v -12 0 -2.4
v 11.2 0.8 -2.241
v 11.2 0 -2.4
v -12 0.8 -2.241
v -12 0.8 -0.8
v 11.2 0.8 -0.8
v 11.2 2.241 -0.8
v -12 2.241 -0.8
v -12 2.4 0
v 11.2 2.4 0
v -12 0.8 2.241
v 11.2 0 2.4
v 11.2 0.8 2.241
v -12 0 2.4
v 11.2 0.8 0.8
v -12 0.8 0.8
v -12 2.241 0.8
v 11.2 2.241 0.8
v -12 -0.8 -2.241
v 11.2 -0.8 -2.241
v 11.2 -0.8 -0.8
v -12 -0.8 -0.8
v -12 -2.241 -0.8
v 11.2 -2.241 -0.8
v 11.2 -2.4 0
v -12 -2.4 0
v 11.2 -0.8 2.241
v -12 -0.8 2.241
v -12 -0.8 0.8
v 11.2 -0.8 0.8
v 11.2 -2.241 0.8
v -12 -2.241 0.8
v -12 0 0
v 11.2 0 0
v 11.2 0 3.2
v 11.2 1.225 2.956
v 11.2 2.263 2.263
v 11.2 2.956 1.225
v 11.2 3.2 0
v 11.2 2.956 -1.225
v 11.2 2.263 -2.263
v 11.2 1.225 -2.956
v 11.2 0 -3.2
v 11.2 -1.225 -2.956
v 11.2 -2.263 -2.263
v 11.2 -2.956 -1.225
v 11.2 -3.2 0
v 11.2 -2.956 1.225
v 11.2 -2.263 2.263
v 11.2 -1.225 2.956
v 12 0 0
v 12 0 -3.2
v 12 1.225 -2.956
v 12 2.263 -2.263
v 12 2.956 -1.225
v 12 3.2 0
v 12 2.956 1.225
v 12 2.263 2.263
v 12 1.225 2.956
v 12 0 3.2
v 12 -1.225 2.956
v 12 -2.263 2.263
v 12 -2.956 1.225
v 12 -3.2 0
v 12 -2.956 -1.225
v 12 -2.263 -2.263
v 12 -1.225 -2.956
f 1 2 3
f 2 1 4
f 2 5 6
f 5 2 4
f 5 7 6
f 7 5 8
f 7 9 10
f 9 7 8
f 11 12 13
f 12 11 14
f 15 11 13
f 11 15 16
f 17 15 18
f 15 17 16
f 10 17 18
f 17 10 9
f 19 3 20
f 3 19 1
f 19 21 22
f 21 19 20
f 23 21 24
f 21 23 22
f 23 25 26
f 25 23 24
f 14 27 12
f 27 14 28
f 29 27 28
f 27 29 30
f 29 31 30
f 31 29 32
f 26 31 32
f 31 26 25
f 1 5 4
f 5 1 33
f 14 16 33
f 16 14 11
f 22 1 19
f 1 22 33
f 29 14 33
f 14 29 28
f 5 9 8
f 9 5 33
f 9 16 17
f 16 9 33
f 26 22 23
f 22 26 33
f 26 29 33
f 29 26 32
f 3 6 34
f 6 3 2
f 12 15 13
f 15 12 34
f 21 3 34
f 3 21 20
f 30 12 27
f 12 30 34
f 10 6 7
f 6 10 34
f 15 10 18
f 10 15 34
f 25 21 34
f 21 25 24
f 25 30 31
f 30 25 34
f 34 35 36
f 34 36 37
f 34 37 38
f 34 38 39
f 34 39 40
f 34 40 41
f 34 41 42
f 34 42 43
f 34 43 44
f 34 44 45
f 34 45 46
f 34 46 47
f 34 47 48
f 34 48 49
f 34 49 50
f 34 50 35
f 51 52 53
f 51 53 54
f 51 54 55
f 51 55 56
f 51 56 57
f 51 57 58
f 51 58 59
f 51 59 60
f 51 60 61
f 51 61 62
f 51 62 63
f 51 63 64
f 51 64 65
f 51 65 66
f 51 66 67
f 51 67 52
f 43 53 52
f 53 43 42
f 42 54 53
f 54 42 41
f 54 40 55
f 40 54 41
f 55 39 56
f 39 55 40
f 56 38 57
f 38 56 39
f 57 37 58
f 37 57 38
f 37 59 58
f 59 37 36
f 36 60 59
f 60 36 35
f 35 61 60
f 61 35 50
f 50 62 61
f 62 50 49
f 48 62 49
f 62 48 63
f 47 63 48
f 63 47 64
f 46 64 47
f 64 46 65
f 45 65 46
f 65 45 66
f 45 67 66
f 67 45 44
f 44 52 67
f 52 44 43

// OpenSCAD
// file: ../p/stud3.scad
use <../lib.scad>
use <4-4cyli.scad>
use <4-4disc.scad>
use <4-4edge.scad>
$fa=1; $fs=0.2;
function ldraw_lib__stud3(realsolid=false) = realsolid ? 
    [openscad(translate([0,0,-eps()], o=cylinder(4+eps(), r=4)),2)] : [
// 0 Stud Tube Solid
// 0 Name: stud3.dat
// 0 Author: James Jessiman
// 0 !LDRAW_ORG Primitive UPDATE 2012-01
// 0 !LICENSE Licensed under CC BY 2.0 and CC BY 4.0 : see CAreadme.txt
// 
// 0 BFC CERTIFY CCW
  [0,"BFC","CERTIFY"],
  [0,"BFC","CCW"],
// 
// 0 !HISTORY 2002-04-04 [sbliss] Modified for BFC compliance
// 0 !HISTORY 2002-04-25 [PTadmin] Official Update 2002-02
// 0 !HISTORY 2007-06-24 [PTadmin] Header formatted for Contributor Agreement
// 0 !HISTORY 2008-07-01 [PTadmin] Official Update 2008-01
// 0 !HISTORY 2012-02-16 [Philo] Changed to CCW
// 0 !HISTORY 2012-03-30 [PTadmin] Official Update 2012-01
// 
// 
// 1 16 0 -4 0 4 0 0 0 1 0 0 0 4 4-4edge.dat
  [1,16,0,-4,0,4,0,0,0,1,0,0,0,4, ldraw_lib__4_4edge(realsolid)],
// 1 16 0 0 0 4 0 0 0 1 0 0 0 4 4-4edge.dat
  [1,16,0,0,0,4,0,0,0,1,0,0,0,4, ldraw_lib__4_4edge(realsolid)],
// 1 16 0 -4 0 4 0 0 0 1 0 0 0 4 4-4disc.dat
  [1,16,0,-4,0,4,0,0,0,1,0,0,0,4, ldraw_lib__4_4disc(realsolid)],
// 1 16 0 -4 0 4 0 0 0 4 0 0 0 4 4-4cyli.dat
  [1,16,0,-4,0,4,0,0,0,4,0,0,0,4, ldraw_lib__4_4cyli(realsolid)],
];
module ldraw_lib__stud3(step=0, col=false, unit=2/5, alt=false, line=0.2, solid=!$preview)
    makepoly(ldraw_lib__stud3(solid), step=step, col=col, unit=unit, alt=alt, line=line, solid=solid);
ldraw_lib__stud3(line=0.2);
// file: ../p/stud.scad
use <../lib.scad>
use <4-4cyli.scad>
use <4-4disc.scad>
use <4-4edge.scad>
$fa=1; $fs=0.2;
function ldraw_lib__stud(realsolid=false) = realsolid ? 
    [openscad(translate([0,0,-eps()], o=cylinder(4+eps(), r=6)),2)] : [
// 0 Stud
// 0 Name: stud.dat
// 0 Author: James Jessiman
// 0 !LDRAW_ORG Primitive UPDATE 2012-01
// 0 !LICENSE Licensed under CC BY 2.0 and CC BY 4.0 : see CAreadme.txt
// 
// 0 BFC CERTIFY CCW
  [0,"BFC","CERTIFY"],
  [0,"BFC","CCW"],
// 
// 0 !HISTORY 2002-04-04 [sbliss] Modified for BFC compliance
// 0 !HISTORY 2002-04-25 [PTadmin] Official Update 2002-02
// 0 !HISTORY 2007-06-24 [PTadmin] Header formatted for Contributor Agreement
// 0 !HISTORY 2008-07-01 [PTadmin] Official Update 2008-01
// 0 !HISTORY 2012-02-16 [Philo] Changed to CCW
// 0 !HISTORY 2012-03-30 [PTadmin] Official Update 2012-01
// 
// 
// 1 16 0 0 0 6 0 0 0 1 0 0 0 6 4-4edge.dat
  [1,16,0,0,0,6,0,0,0,1,0,0,0,6, ldraw_lib__4_4edge(realsolid)],
// 1 16 0 -4 0 6 0 0 0 1 0 0 0 6 4-4edge.dat
  [1,16,0,-4,0,6,0,0,0,1,0,0,0,6, ldraw_lib__4_4edge(realsolid)],
// 1 16 0 0 0 6 0 0 0 -4 0 0 0 6 4-4cyli.dat
  [1,16,0,0,0,6,0,0,0,-4,0,0,0,6, ldraw_lib__4_4cyli(realsolid)],
// 1 16 0 -4 0 6 0 0 0 1 0 0 0 6 4-4disc.dat
  [1,16,0,-4,0,6,0,0,0,1,0,0,0,6, ldraw_lib__4_4disc(realsolid)],
];
module ldraw_lib__stud(step=0, col=false, unit=2/5, alt=false, line=0.2, solid=!$preview)
    makepoly(ldraw_lib__stud(solid), step=step, col=col, unit=unit, alt=alt, line=line, solid=solid);
ldraw_lib__stud(line=0.2);
// file: ../p/box5.scad
use <../lib.scad>
$fa=1; $fs=0.2;
function ldraw_lib__box5(realsolid=false) = [
// 0 Box with 5 Faces and All Edges
// 0 Name: box5.dat
// 0 Author: James Jessiman
// 0 !LDRAW_ORG Primitive UPDATE 2012-01
// 0 !LICENSE Licensed under CC BY 2.0 and CC BY 4.0 : see CAreadme.txt
// 
// 0 BFC CERTIFY CCW
  [0,"BFC","CERTIFY"],
  [0,"BFC","CCW"],
// 
// 0 !HISTORY 2002-04-03 [sbliss] Modified for BFC compliance
// 0 !HISTORY 2002-04-25 [PTadmin] Official Update 2002-02
// 0 !HISTORY 2007-06-24 [PTadmin] Header formatted for Contributor Agreement
// 0 !HISTORY 2008-07-01 [PTadmin] Official Update 2008-01
// 0 !HISTORY 2012-02-16 [Philo] Changed to CCW
// 0 !HISTORY 2012-03-30 [PTadmin] Official Update 2012-01
// 
// 
// 2 24 1 1 1 -1 1 1
  [2,24,1,1,1,-1,1,1],
// 2 24 -1 1 1 -1 1 -1
  [2,24,-1,1,1,-1,1,-1],
// 2 24 -1 1 -1 1 1 -1
  [2,24,-1,1,-1,1,1,-1],
// 2 24 1 1 -1 1 1 1
  [2,24,1,1,-1,1,1,1],
// 2 24 1 0 1 -1 0 1
  [2,24,1,0,1,-1,0,1],
// 2 24 -1 0 1 -1 0 -1
  [2,24,-1,0,1,-1,0,-1],
// 2 24 -1 0 -1 1 0 -1
  [2,24,-1,0,-1,1,0,-1],
// 2 24 1 0 -1 1 0 1
  [2,24,1,0,-1,1,0,1],
// 2 24 1 0 1 1 1 1
  [2,24,1,0,1,1,1,1],
// 2 24 -1 0 1 -1 1 1
  [2,24,-1,0,1,-1,1,1],
// 2 24 1 0 -1 1 1 -1
  [2,24,1,0,-1,1,1,-1],
// 2 24 -1 0 -1 -1 1 -1
  [2,24,-1,0,-1,-1,1,-1],
// 4 16 -1 1 1 1 1 1 1 1 -1 -1 1 -1
  [4,16,-1,1,1,1,1,1,1,1,-1,-1,1,-1],
// 4 16 -1 1 1 -1 0 1 1 0 1 1 1 1
  [4,16,-1,1,1,-1,0,1,1,0,1,1,1,1],
// 4 16 -1 1 -1 -1 0 -1 -1 0 1 -1 1 1
  [4,16,-1,1,-1,-1,0,-1,-1,0,1,-1,1,1],
// 4 16 1 1 -1 1 0 -1 -1 0 -1 -1 1 -1
  [4,16,1,1,-1,1,0,-1,-1,0,-1,-1,1,-1],
// 4 16 1 1 1 1 0 1 1 0 -1 1 1 -1
  [4,16,1,1,1,1,0,1,1,0,-1,1,1,-1],
];
module ldraw_lib__box5(step=0, col=false, unit=2/5, alt=false, line=0.2, solid=!$preview)
    makepoly(ldraw_lib__box5(solid), step=step, col=col, unit=unit, alt=alt, line=line, solid=solid);
ldraw_lib__box5(line=0.2);
// file: ../p/box4t.scad
use <../lib.scad>
$fa=1; $fs=0.2;
function ldraw_lib__box4t(realsolid=false) = [
// 0 Box with 4 Adjacent Faces and All Edges
// 0 Name: box4t.dat
// 0 Author: Tore Eriksson [Tore_Eriksson]
// 0 !LDRAW_ORG Primitive UPDATE 2003-02
// 0 !LICENSE Licensed under CC BY 2.0 and CC BY 4.0 : see CAreadme.txt
// 
// 0 BFC CERTIFY CCW
  [0,"BFC","CERTIFY"],
  [0,"BFC","CCW"],
// 
// 0 !HISTORY 1997-09-29 [PTadmin] Official Update 1997-15
// 0 !HISTORY 2002-08-31 [izanette] Modified with WINDZ for BFC compliance
// 0 !HISTORY 2003-08-01 [PTadmin] Official Update 2003-02
// 0 !HISTORY 2007-06-24 [PTadmin] Header formatted for Contributor Agreement
// 0 !HISTORY 2008-07-01 [PTadmin] Official Update 2008-01
// 
// 
// 2 24 1 1 1 -1 1 1
  [2,24,1,1,1,-1,1,1],
// 2 24 -1 1 1 -1 1 -1
  [2,24,-1,1,1,-1,1,-1],
// 2 24 -1 1 -1 1 1 -1
  [2,24,-1,1,-1,1,1,-1],
// 2 24 1 1 -1 1 1 1
  [2,24,1,1,-1,1,1,1],
// 2 24 1 0 1 -1 0 1
  [2,24,1,0,1,-1,0,1],
// 2 24 -1 0 1 -1 0 -1
  [2,24,-1,0,1,-1,0,-1],
// 2 24 -1 0 -1 1 0 -1
  [2,24,-1,0,-1,1,0,-1],
// 2 24 1 0 -1 1 0 1
  [2,24,1,0,-1,1,0,1],
// 2 24 1 0 1 1 1 1
  [2,24,1,0,1,1,1,1],
// 2 24 -1 0 1 -1 1 1
  [2,24,-1,0,1,-1,1,1],
// 2 24 1 0 -1 1 1 -1
  [2,24,1,0,-1,1,1,-1],
// 2 24 -1 0 -1 -1 1 -1
  [2,24,-1,0,-1,-1,1,-1],
// 4 16 1 1 1 1 1 -1 -1 1 -1 -1 1 1
  [4,16,1,1,1,1,1,-1,-1,1,-1,-1,1,1],
// 4 16 1 1 1 -1 1 1 -1 0 1 1 0 1
  [4,16,1,1,1,-1,1,1,-1,0,1,1,0,1],
// 4 16 -1 1 1 -1 1 -1 -1 0 -1 -1 0 1
  [4,16,-1,1,1,-1,1,-1,-1,0,-1,-1,0,1],
// 0 4 16 -1 1 -1 -1 0 -1 1 0 -1 1 1 -1
// 4 16 1 1 -1 1 1 1 1 0 1 1 0 -1
  [4,16,1,1,-1,1,1,1,1,0,1,1,0,-1],
// 0
];
module ldraw_lib__box4t(step=0, col=false, unit=2/5, alt=false, line=0.2, solid=!$preview)
    makepoly(ldraw_lib__box4t(solid), step=step, col=col, unit=unit, alt=alt, line=line, solid=solid);
ldraw_lib__box4t(line=0.2);
// file: s/3004s01.scad
use <../../lib.scad>
use <../../p/box4t.scad>
use <../../p/box5.scad>
use <../../p/stud.scad>
use <../../p/stud3.scad>
$fa=1; $fs=0.2;
function ldraw_lib__s__3004s01(realsolid=false) = [
// 0 ~Brick  1 x  2 without Front Face
// 0 Name: s\3004s01.dat
// 0 Author: James Jessiman
// 0 !LDRAW_ORG Subpart UPDATE 2003-03
// 0 !LICENSE Licensed under CC BY 2.0 and CC BY 4.0 : see CAreadme.txt
// 
// 0 BFC CERTIFY CCW
  [0,"BFC","CERTIFY"],
  [0,"BFC","CCW"],
// 
// 0 !HISTORY 2003-09-07 [jriley] Subfiling, BFC
// 0 !HISTORY 2003-12-19 [PTadmin] Official Update 2003-03
// 0 !HISTORY 2007-08-29 [PTadmin] Header formatted for Contributor Agreement
// 0 !HISTORY 2008-07-01 [PTadmin] Official Update 2008-01
// 
// 
// 1 16 0 4 0 1 0 0 0 -5 0 0 0 1 stud3.dat
  [1,16,0,4,0,1,0,0,0,-5,0,0,0,1, ldraw_lib__stud3(realsolid)],
// 0 BFC INVERTNEXT
  [0,"BFC","INVERTNEXT"],
// 1 16 0 24 0 16 0 0 0 -20 0 0 0 6 box5.dat
  [1,16,0,24,0,16,0,0,0,-20,0,0,0,6, ldraw_lib__box5(realsolid)],
// 4 16 20 24 10 16 24 6 -16 24 6 -20 24 10
  [4,16,20,24,10,16,24,6,-16,24,6,-20,24,10],
// 4 16 -20 24 10 -16 24 6 -16 24 -6 -20 24 -10
  [4,16,-20,24,10,-16,24,6,-16,24,-6,-20,24,-10],
// 4 16 -20 24 -10 -16 24 -6 16 24 -6 20 24 -10
  [4,16,-20,24,-10,-16,24,-6,16,24,-6,20,24,-10],
// 4 16 20 24 -10 16 24 -6 16 24 6 20 24 10
  [4,16,20,24,-10,16,24,-6,16,24,6,20,24,10],
// 1 16 0 24 0 20 0 0 0 -24 0 0 0 10 box4t.dat
  [1,16,0,24,0,20,0,0,0,-24,0,0,0,10, ldraw_lib__box4t(realsolid)],
// 1 16 10 0 0 1 0 0 0 1 0 0 0 1 stud.dat
  [1,16,10,0,0,1,0,0,0,1,0,0,0,1, ldraw_lib__stud(realsolid)],
// 1 16 -10 0 0 1 0 0 0 1 0 0 0 1 stud.dat
  [1,16,-10,0,0,1,0,0,0,1,0,0,0,1, ldraw_lib__stud(realsolid)],
// 0
];
module ldraw_lib__s__3004s01(step=0, col=false, unit=2/5, alt=false, line=0.2, solid=!$preview)
    makepoly(ldraw_lib__s__3004s01(solid), step=step, col=col, unit=unit, alt=alt, line=line, solid=solid);
ldraw_lib__s__3004s01(line=0.2);
// file: ../p/4-4edge.scad
use <../lib.scad>
$fa=1; $fs=0.2;
function ldraw_lib__4_4edge(realsolid=false) = [
// 0 Circle 1.0
// 0 Name: 4-4edge.dat
// 0 Author: James Jessiman
// 0 !LDRAW_ORG Primitive UPDATE 2017-01
// 0 !LICENSE Licensed under CC BY 2.0 and CC BY 4.0 : see CAreadme.txt
// 
// 0 BFC CERTIFY CCW
  [0,"BFC","CERTIFY"],
  [0,"BFC","CCW"],
// 
// 0 !HISTORY 1998-12-15 [PTadmin] Official Update 1998-10
// 0 !HISTORY 2005-12-28 [PTadmin] Official Update 2005-01
// 0 !HISTORY 2007-06-24 [PTadmin] Header formatted for Contributor Agreement
// 0 !HISTORY 2008-07-01 [PTadmin] Official Update 2008-01
// 0 !HISTORY 2017-01-15 [Steffen] BFCed
// 0 !HISTORY 2017-12-30 [PTadmin] Official Update 2017-01
// 
// 
// 2 24 1 0 0 0.9239 0 0.3827
  [2,24,1,0,0,0.9239,0,0.3827],
// 2 24 0.9239 0 0.3827 0.7071 0 0.7071
  [2,24,0.9239,0,0.3827,0.7071,0,0.7071],
// 2 24 0.7071 0 0.7071 0.3827 0 0.9239
  [2,24,0.7071,0,0.7071,0.3827,0,0.9239],
// 2 24 0.3827 0 0.9239 0 0 1
  [2,24,0.3827,0,0.9239,0,0,1],
// 2 24 0 0 1 -0.3827 0 0.9239
  [2,24,0,0,1,-0.3827,0,0.9239],
// 2 24 -0.3827 0 0.9239 -0.7071 0 0.7071
  [2,24,-0.3827,0,0.9239,-0.7071,0,0.7071],
// 2 24 -0.7071 0 0.7071 -0.9239 0 0.3827
  [2,24,-0.7071,0,0.7071,-0.9239,0,0.3827],
// 2 24 -0.9239 0 0.3827 -1 0 -0
  [2,24,-0.9239,0,0.3827,-1,0,-0],
// 2 24 -1 0 -0 -0.9239 0 -0.3827
  [2,24,-1,0,-0,-0.9239,0,-0.3827],
// 2 24 -0.9239 0 -0.3827 -0.7071 0 -0.7071
  [2,24,-0.9239,0,-0.3827,-0.7071,0,-0.7071],
// 2 24 -0.7071 0 -0.7071 -0.3827 0 -0.9239
  [2,24,-0.7071,0,-0.7071,-0.3827,0,-0.9239],
// 2 24 -0.3827 0 -0.9239 0 0 -1
  [2,24,-0.3827,0,-0.9239,0,0,-1],
// 2 24 0 0 -1 0.3827 0 -0.9239
  [2,24,0,0,-1,0.3827,0,-0.9239],
// 2 24 0.3827 0 -0.9239 0.7071 0 -0.7071
  [2,24,0.3827,0,-0.9239,0.7071,0,-0.7071],
// 2 24 0.7071 0 -0.7071 0.9239 0 -0.3827
  [2,24,0.7071,0,-0.7071,0.9239,0,-0.3827],
// 2 24 0.9239 0 -0.3827 1 0 0
  [2,24,0.9239,0,-0.3827,1,0,0],
];
module ldraw_lib__4_4edge(step=0, col=false, unit=2/5, alt=false, line=0.2, solid=!$preview)
    makepoly(ldraw_lib__4_4edge(solid), step=step, col=col, unit=unit, alt=alt, line=line, solid=solid);
ldraw_lib__4_4edge(line=0.2);
// file: ../p/4-4cyli.scad
use <../lib.scad>
$fa=1; $fs=0.2;
function ldraw_lib__4_4cyli(realsolid=false) = [
// 0 Cylinder 1.0
// 0 Name: 4-4cyli.dat
// 0 Author: James Jessiman
// 0 !LDRAW_ORG Primitive UPDATE 2005-01
// 0 !LICENSE Licensed under CC BY 2.0 and CC BY 4.0 : see CAreadme.txt
// 
// 0 BFC CERTIFY CCW
  [0,"BFC","CERTIFY"],
  [0,"BFC","CCW"],
// 
// 0 !HISTORY 1998-12-15 [PTadmin] Official Update 1998-10
// 0 !HISTORY 2002-03-23 [sbliss] Added BFC statement; merged headers from files in distributions LDraw 0.27 and Complete.
// 0 !HISTORY 2002-04-25 [PTadmin] Official Update 2002-02
// 0 !HISTORY 2004-12-14 [guyvivan] BFC CCW
// 0 !HISTORY 2005-12-28 [PTadmin] Official Update 2005-01
// 0 !HISTORY 2007-06-24 [PTadmin] Header formatted for Contributor Agreement
// 0 !HISTORY 2008-07-01 [PTadmin] Official Update 2008-01
// 
// 
// 4 16 1 1 0 0.9239 1 0.3827 0.9239 0 0.3827 1 0 0
  [4,16,1,1,0,0.9239,1,0.3827,0.9239,0,0.3827,1,0,0],
// 5 24 1 0 0 1 1 0 0.9239 0 0.3827 0.9239 0 -0.3827
  [5,24,1,0,0,1,1,0,0.9239,0,0.3827,0.9239,0,-0.3827],
// 4 16 0.9239 1 0.3827 0.7071 1 0.7071 0.7071 0 0.7071 0.9239 0 0.3827
  [4,16,0.9239,1,0.3827,0.7071,1,0.7071,0.7071,0,0.7071,0.9239,0,0.3827],
// 5 24 0.9239 0 0.3827 0.9239 1 0.3827 0.7071 0 0.7071 1 0 0
  [5,24,0.9239,0,0.3827,0.9239,1,0.3827,0.7071,0,0.7071,1,0,0],
// 4 16 0.7071 1 0.7071 0.3827 1 0.9239 0.3827 0 0.9239 0.7071 0 0.7071
  [4,16,0.7071,1,0.7071,0.3827,1,0.9239,0.3827,0,0.9239,0.7071,0,0.7071],
// 5 24 0.7071 0 0.7071 0.7071 1 0.7071 0.3827 0 0.9239 0.9239 0 0.3827
  [5,24,0.7071,0,0.7071,0.7071,1,0.7071,0.3827,0,0.9239,0.9239,0,0.3827],
// 4 16 0.3827 1 0.9239 0 1 1 0 0 1 0.3827 0 0.9239
  [4,16,0.3827,1,0.9239,0,1,1,0,0,1,0.3827,0,0.9239],
// 5 24 0.3827 0 0.9239 0.3827 1 0.9239 0 0 1 0.7071 0 0.7071
  [5,24,0.3827,0,0.9239,0.3827,1,0.9239,0,0,1,0.7071,0,0.7071],
// 4 16 0 1 1 -0.3827 1 0.9239 -0.3827 0 0.9239 0 0 1
  [4,16,0,1,1,-0.3827,1,0.9239,-0.3827,0,0.9239,0,0,1],
// 5 24 0 0 1 0 1 1 -0.3827 0 0.9239 0.3827 0 0.9239
  [5,24,0,0,1,0,1,1,-0.3827,0,0.9239,0.3827,0,0.9239],
// 4 16 -0.3827 1 0.9239 -0.7071 1 0.7071 -0.7071 0 0.7071 -0.3827 0 0.9239
  [4,16,-0.3827,1,0.9239,-0.7071,1,0.7071,-0.7071,0,0.7071,-0.3827,0,0.9239],
// 5 24 -0.3827 0 0.9239 -0.3827 1 0.9239 -0.7071 0 0.7071 0 0 1
  [5,24,-0.3827,0,0.9239,-0.3827,1,0.9239,-0.7071,0,0.7071,0,0,1],
// 4 16 -0.7071 1 0.7071 -0.9239 1 0.3827 -0.9239 0 0.3827 -0.7071 0 0.7071
  [4,16,-0.7071,1,0.7071,-0.9239,1,0.3827,-0.9239,0,0.3827,-0.7071,0,0.7071],
// 5 24 -0.7071 0 0.7071 -0.7071 1 0.7071 -0.9239 0 0.3827 -0.3827 0 0.9239
  [5,24,-0.7071,0,0.7071,-0.7071,1,0.7071,-0.9239,0,0.3827,-0.3827,0,0.9239],
// 4 16 -0.9239 1 0.3827 -1 1 0 -1 0 0 -0.9239 0 0.3827
  [4,16,-0.9239,1,0.3827,-1,1,0,-1,0,0,-0.9239,0,0.3827],
// 5 24 -0.9239 0 0.3827 -0.9239 1 0.3827 -1 0 0 -0.7071 0 0.7071
  [5,24,-0.9239,0,0.3827,-0.9239,1,0.3827,-1,0,0,-0.7071,0,0.7071],
// 4 16 -1 1 0 -0.9239 1 -0.3827 -0.9239 0 -0.3827 -1 0 0
  [4,16,-1,1,0,-0.9239,1,-0.3827,-0.9239,0,-0.3827,-1,0,0],
// 5 24 -1 0 0 -1 1 0 -0.9239 0 -0.3827 -0.9239 0 0.3827
  [5,24,-1,0,0,-1,1,0,-0.9239,0,-0.3827,-0.9239,0,0.3827],
// 4 16 -0.9239 1 -0.3827 -0.7071 1 -0.7071 -0.7071 0 -0.7071 -0.9239 0 -0.3827
  [4,16,-0.9239,1,-0.3827,-0.7071,1,-0.7071,-0.7071,0,-0.7071,-0.9239,0,-0.3827],
// 5 24 -0.9239 0 -0.3827 -0.9239 1 -0.3827 -0.7071 0 -0.7071 -1 0 0
  [5,24,-0.9239,0,-0.3827,-0.9239,1,-0.3827,-0.7071,0,-0.7071,-1,0,0],
// 4 16 -0.7071 1 -0.7071 -0.3827 1 -0.9239 -0.3827 0 -0.9239 -0.7071 0 -0.7071
  [4,16,-0.7071,1,-0.7071,-0.3827,1,-0.9239,-0.3827,0,-0.9239,-0.7071,0,-0.7071],
// 5 24 -0.7071 0 -0.7071 -0.7071 1 -0.7071 -0.3827 0 -0.9239 -0.9239 0 -0.3827
  [5,24,-0.7071,0,-0.7071,-0.7071,1,-0.7071,-0.3827,0,-0.9239,-0.9239,0,-0.3827],
// 4 16 -0.3827 1 -0.9239 0 1 -1 0 0 -1 -0.3827 0 -0.9239
  [4,16,-0.3827,1,-0.9239,0,1,-1,0,0,-1,-0.3827,0,-0.9239],
// 5 24 -0.3827 0 -0.9239 -0.3827 1 -0.9239 0 0 -1 -0.7071 0 -0.7071
  [5,24,-0.3827,0,-0.9239,-0.3827,1,-0.9239,0,0,-1,-0.7071,0,-0.7071],
// 4 16 0 1 -1 0.3827 1 -0.9239 0.3827 0 -0.9239 0 0 -1
  [4,16,0,1,-1,0.3827,1,-0.9239,0.3827,0,-0.9239,0,0,-1],
// 5 24 0 0 -1 0 1 -1 0.3827 0 -0.9239 -0.3827 0 -0.9239
  [5,24,0,0,-1,0,1,-1,0.3827,0,-0.9239,-0.3827,0,-0.9239],
// 4 16 0.3827 1 -0.9239 0.7071 1 -0.7071 0.7071 0 -0.7071 0.3827 0 -0.9239
  [4,16,0.3827,1,-0.9239,0.7071,1,-0.7071,0.7071,0,-0.7071,0.3827,0,-0.9239],
// 5 24 0.3827 0 -0.9239 0.3827 1 -0.9239 0.7071 0 -0.7071 0 0 -1
  [5,24,0.3827,0,-0.9239,0.3827,1,-0.9239,0.7071,0,-0.7071,0,0,-1],
// 4 16 0.7071 1 -0.7071 0.9239 1 -0.3827 0.9239 0 -0.3827 0.7071 0 -0.7071
  [4,16,0.7071,1,-0.7071,0.9239,1,-0.3827,0.9239,0,-0.3827,0.7071,0,-0.7071],
// 5 24 0.7071 0 -0.7071 0.7071 1 -0.7071 0.9239 0 -0.3827 0.3827 0 -0.9239
  [5,24,0.7071,0,-0.7071,0.7071,1,-0.7071,0.9239,0,-0.3827,0.3827,0,-0.9239],
// 4 16 0.9239 1 -0.3827 1 1 0 1 0 0 0.9239 0 -0.3827
  [4,16,0.9239,1,-0.3827,1,1,0,1,0,0,0.9239,0,-0.3827],
// 5 24 0.9239 0 -0.3827 0.9239 1 -0.3827 1 0 0 0.7071 0 -0.7071
  [5,24,0.9239,0,-0.3827,0.9239,1,-0.3827,1,0,0,0.7071,0,-0.7071],
// 0
];
module ldraw_lib__4_4cyli(step=0, col=false, unit=2/5, alt=false, line=0.2, solid=!$preview)
    makepoly(ldraw_lib__4_4cyli(solid), step=step, col=col, unit=unit, alt=alt, line=line, solid=solid);
ldraw_lib__4_4cyli(line=0.2);
// file: 3004.scad
use <../lib.scad>
use <s/3004s01.scad>
$fa=1; $fs=0.2;
function ldraw_lib__3004(realsolid=false) = [
// 0 Brick  1 x  2
// 0 Name: 3004.dat
// 0 Author: James Jessiman
// 0 !LDRAW_ORG Part UPDATE 2022-05
// 0 !LICENSE Licensed under CC BY 2.0 and CC BY 4.0 : see CAreadme.txt
// 
// 0 BFC CERTIFY CCW
  [0,"BFC","CERTIFY"],
  [0,"BFC","CCW"],
// 
// 0 !HISTORY 2001-10-26 [PTadmin] Official Update 2001-01
// 0 !HISTORY 2002-05-07 {unknown} BFC Certification
// 0 !HISTORY 2002-06-11 [PTadmin] Official Update 2002-03
// 0 !HISTORY 2007-05-07 [PTadmin] Header formatted for Contributor Agreement
// 0 !HISTORY 2008-07-01 [PTadmin] Official Update 2008-01
// 0 !HISTORY 2022-08-04 [MagFors] Using subfile
// 0 !HISTORY 2022-09-15 [PTadmin] Official Update 2022-05
// 
// 
// 1 16 0 0 0 1 0 0 0 1 0 0 0 1 s\3004s01.dat
  [1,16,0,0,0,1,0,0,0,1,0,0,0,1, ldraw_lib__s__3004s01(realsolid)],
// 4 16 -20 24 -10 20 24 -10 20 0 -10 -20 0 -10
  [4,16,-20,24,-10,20,24,-10,20,0,-10,-20,0,-10],
];
module ldraw_lib__3004(step=0, col=false, unit=2/5, alt=false, line=0.2, solid=!$preview)
    makepoly(ldraw_lib__3004(solid), step=step, col=col, unit=unit, alt=alt, line=line, solid=solid);
ldraw_lib__3004(line=0.2);
// file: ../p/axle.scad
use <../lib.scad>
$fa=1; $fs=0.2;
function ldraw_lib__axle(realsolid=false) = [
// 0 Axle
// 0 Name: axle.dat
// 0 Author: James Jessiman
// 0 !LDRAW_ORG Primitive UPDATE 2003-01
// 0 !LICENSE Licensed under CC BY 2.0 and CC BY 4.0 : see CAreadme.txt
// 
// 0 BFC CERTIFY CCW
  [0,"BFC","CERTIFY"],
  [0,"BFC","CCW"],
// 
// 0 !HISTORY 2000-04-23 [sbliss] Added conditional edges along outermost diameters
// 0 !HISTORY 2000-05-07 [PTadmin] Official Update 2000-01
// 0 !HISTORY 2002-11-08 [OrionP] Adjusted fit and precision
// 0 !HISTORY 2003-03-12 [PTadmin] Official Update 2003-01
// 0 !HISTORY 2007-06-24 [PTadmin] Header formatted for Contributor Agreement
// 0 !HISTORY 2008-07-01 [PTadmin] Official Update 2008-01
// 
// 
// 5 24 6 0 0 6 1 0 5.602 0 2 5.602 0 -2
  [5,24,6,0,0,6,1,0,5.602,0,2,5.602,0,-2],
// 5 24 0 0 6 0 1 6 2 0 5.602 -2 0 5.602
  [5,24,0,0,6,0,1,6,2,0,5.602,-2,0,5.602],
// 5 24 -6 0 0 -6 1 0 -5.602 0 -2 -5.602 0 2
  [5,24,-6,0,0,-6,1,0,-5.602,0,-2,-5.602,0,2],
// 5 24 0 0 -6 0 1 -6 -2 0 -5.602 2 0 -5.602
  [5,24,0,0,-6,0,1,-6,-2,0,-5.602,2,0,-5.602],
// 
// 2 24 6 0 0 5.602 0 2
  [2,24,6,0,0,5.602,0,2],
// 2 24 5.602 0 2 2 0 2
  [2,24,5.602,0,2,2,0,2],
// 2 24 2 0 2 2 0 5.602
  [2,24,2,0,2,2,0,5.602],
// 2 24 2 0 5.602 0 0 6
  [2,24,2,0,5.602,0,0,6],
// 2 24 -6 0 0 -5.602 0 2
  [2,24,-6,0,0,-5.602,0,2],
// 2 24 -5.602 0 2 -2 0 2
  [2,24,-5.602,0,2,-2,0,2],
// 2 24 -2 0 2 -2 0 5.602
  [2,24,-2,0,2,-2,0,5.602],
// 2 24 -2 0 5.602 -0 0 6
  [2,24,-2,0,5.602,-0,0,6],
// 2 24 6 0 -0 5.602 0 -2
  [2,24,6,0,-0,5.602,0,-2],
// 2 24 5.602 0 -2 2 0 -2
  [2,24,5.602,0,-2,2,0,-2],
// 2 24 2 0 -2 2 0 -5.602
  [2,24,2,0,-2,2,0,-5.602],
// 2 24 2 0 -5.602 0 0 -6
  [2,24,2,0,-5.602,0,0,-6],
// 2 24 -6 0 -0 -5.602 0 -2
  [2,24,-6,0,-0,-5.602,0,-2],
// 2 24 -5.602 0 -2 -2 0 -2
  [2,24,-5.602,0,-2,-2,0,-2],
// 2 24 -2 0 -2 -2 0 -5.602
  [2,24,-2,0,-2,-2,0,-5.602],
// 2 24 -2 0 -5.602 -0 0 -6
  [2,24,-2,0,-5.602,-0,0,-6],
// 2 24 6 1 0 5.602 1 2
  [2,24,6,1,0,5.602,1,2],
// 2 24 5.602 1 2 2 1 2
  [2,24,5.602,1,2,2,1,2],
// 2 24 2 1 2 2 1 5.602
  [2,24,2,1,2,2,1,5.602],
// 2 24 2 1 5.602 0 1 6
  [2,24,2,1,5.602,0,1,6],
// 2 24 -6 1 0 -5.602 1 2
  [2,24,-6,1,0,-5.602,1,2],
// 2 24 -5.602 1 2 -2 1 2
  [2,24,-5.602,1,2,-2,1,2],
// 2 24 -2 1 2 -2 1 5.602
  [2,24,-2,1,2,-2,1,5.602],
// 2 24 -2 1 5.602 -0 1 6
  [2,24,-2,1,5.602,-0,1,6],
// 2 24 6 1 -0 5.602 1 -2
  [2,24,6,1,-0,5.602,1,-2],
// 2 24 5.602 1 -2 2 1 -2
  [2,24,5.602,1,-2,2,1,-2],
// 2 24 2 1 -2 2 1 -5.602
  [2,24,2,1,-2,2,1,-5.602],
// 2 24 2 1 -5.602 0 1 -6
  [2,24,2,1,-5.602,0,1,-6],
// 2 24 -6 1 -0 -5.602 1 -2
  [2,24,-6,1,-0,-5.602,1,-2],
// 2 24 -5.602 1 -2 -2 1 -2
  [2,24,-5.602,1,-2,-2,1,-2],
// 2 24 -2 1 -2 -2 1 -5.602
  [2,24,-2,1,-2,-2,1,-5.602],
// 2 24 -2 1 -5.602 -0 1 -6
  [2,24,-2,1,-5.602,-0,1,-6],
// 
// 2 24 5.602 0 2 5.602 1 2
  [2,24,5.602,0,2,5.602,1,2],
// 2 24 2 0 2 2 1 2
  [2,24,2,0,2,2,1,2],
// 2 24 2 0 5.602 2 1 5.602
  [2,24,2,0,5.602,2,1,5.602],
// 2 24 -5.602 0 2 -5.602 1 2
  [2,24,-5.602,0,2,-5.602,1,2],
// 2 24 -2 0 2 -2 1 2
  [2,24,-2,0,2,-2,1,2],
// 2 24 -2 0 5.602 -2 1 5.602
  [2,24,-2,0,5.602,-2,1,5.602],
// 2 24 5.602 0 -2 5.602 1 -2
  [2,24,5.602,0,-2,5.602,1,-2],
// 2 24 2 0 -2 2 1 -2
  [2,24,2,0,-2,2,1,-2],
// 2 24 2 0 -5.602 2 1 -5.602
  [2,24,2,0,-5.602,2,1,-5.602],
// 2 24 -5.602 0 -2 -5.602 1 -2
  [2,24,-5.602,0,-2,-5.602,1,-2],
// 2 24 -2 0 -2 -2 1 -2
  [2,24,-2,0,-2,-2,1,-2],
// 2 24 -2 0 -5.602 -2 1 -5.602
  [2,24,-2,0,-5.602,-2,1,-5.602],
// 
// 4 16 6 0 0 6 1 0 5.602 1 2 5.602 0 2
  [4,16,6,0,0,6,1,0,5.602,1,2,5.602,0,2],
// 4 16 5.602 0 2 5.602 1 2 2 1 2 2 0 2
  [4,16,5.602,0,2,5.602,1,2,2,1,2,2,0,2],
// 4 16 2 0 2 2 1 2 2 1 5.602 2 0 5.602
  [4,16,2,0,2,2,1,2,2,1,5.602,2,0,5.602],
// 4 16 2 0 5.602 2 1 5.602 0 1 6 0 0 6
  [4,16,2,0,5.602,2,1,5.602,0,1,6,0,0,6],
// 4 16 -6 0 0 -5.602 0 2 -5.602 1 2 -6 1 0
  [4,16,-6,0,0,-5.602,0,2,-5.602,1,2,-6,1,0],
// 4 16 -5.602 0 2 -2 0 2 -2 1 2 -5.602 1 2
  [4,16,-5.602,0,2,-2,0,2,-2,1,2,-5.602,1,2],
// 4 16 -2 0 2 -2 0 5.602 -2 1 5.602 -2 1 2
  [4,16,-2,0,2,-2,0,5.602,-2,1,5.602,-2,1,2],
// 4 16 -2 0 5.602 -0 0 6 -0 1 6 -2 1 5.602
  [4,16,-2,0,5.602,-0,0,6,-0,1,6,-2,1,5.602],
// 4 16 6 0 -0 5.602 0 -2 5.602 1 -2 6 1 -0
  [4,16,6,0,-0,5.602,0,-2,5.602,1,-2,6,1,-0],
// 4 16 5.602 0 -2 2 0 -2 2 1 -2 5.602 1 -2
  [4,16,5.602,0,-2,2,0,-2,2,1,-2,5.602,1,-2],
// 4 16 2 0 -2 2 0 -5.602 2 1 -5.602 2 1 -2
  [4,16,2,0,-2,2,0,-5.602,2,1,-5.602,2,1,-2],
// 4 16 2 0 -5.602 0 0 -6 0 1 -6 2 1 -5.602
  [4,16,2,0,-5.602,0,0,-6,0,1,-6,2,1,-5.602],
// 4 16 -6 0 -0 -6 1 -0 -5.602 1 -2 -5.602 0 -2
  [4,16,-6,0,-0,-6,1,-0,-5.602,1,-2,-5.602,0,-2],
// 4 16 -5.602 0 -2 -5.602 1 -2 -2 1 -2 -2 0 -2
  [4,16,-5.602,0,-2,-5.602,1,-2,-2,1,-2,-2,0,-2],
// 4 16 -2 0 -2 -2 1 -2 -2 1 -5.602 -2 0 -5.602
  [4,16,-2,0,-2,-2,1,-2,-2,1,-5.602,-2,0,-5.602],
// 4 16 -2 0 -5.602 -2 1 -5.602 -0 1 -6 -0 0 -6
  [4,16,-2,0,-5.602,-2,1,-5.602,-0,1,-6,-0,0,-6],
// 
// 4 16 6 0 0 5.602 0 2 2 0 2 0 0 0
  [4,16,6,0,0,5.602,0,2,2,0,2,0,0,0],
// 4 16 -6 0 0 0 0 0 -2 0 2 -5.602 0 2
  [4,16,-6,0,0,0,0,0,-2,0,2,-5.602,0,2],
// 4 16 6 0 0 0 0 0 2 0 -2 5.602 0 -2
  [4,16,6,0,0,0,0,0,2,0,-2,5.602,0,-2],
// 4 16 -6 0 0 -5.602 0 -2 -2 0 -2 0 0 0
  [4,16,-6,0,0,-5.602,0,-2,-2,0,-2,0,0,0],
// 4 16 0 0 6 0 0 0 2 0 2 2 0 5.602
  [4,16,0,0,6,0,0,0,2,0,2,2,0,5.602],
// 4 16 0 0 6 -2 0 5.602 -2 0 2 0 0 0
  [4,16,0,0,6,-2,0,5.602,-2,0,2,0,0,0],
// 4 16 0 0 -6 2 0 -5.602 2 0 -2 0 0 0
  [4,16,0,0,-6,2,0,-5.602,2,0,-2,0,0,0],
// 4 16 0 0 -6 0 0 0 -2 0 -2 -2 0 -5.602
  [4,16,0,0,-6,0,0,0,-2,0,-2,-2,0,-5.602],
// 4 16 6 1 0 0 1 0 2 1 2 5.602 1 2
  [4,16,6,1,0,0,1,0,2,1,2,5.602,1,2],
// 4 16 -6 1 0 -5.602 1 2 -2 1 2 0 1 0
  [4,16,-6,1,0,-5.602,1,2,-2,1,2,0,1,0],
// 4 16 6 1 0 5.602 1 -2 2 1 -2 0 1 0
  [4,16,6,1,0,5.602,1,-2,2,1,-2,0,1,0],
// 4 16 -6 1 0 0 1 0 -2 1 -2 -5.602 1 -2
  [4,16,-6,1,0,0,1,0,-2,1,-2,-5.602,1,-2],
// 4 16 0 1 6 2 1 5.602 2 1 2 0 1 0
  [4,16,0,1,6,2,1,5.602,2,1,2,0,1,0],
// 4 16 0 1 6 0 1 0 -2 1 2 -2 1 5.602
  [4,16,0,1,6,0,1,0,-2,1,2,-2,1,5.602],
// 4 16 0 1 -6 0 1 0 2 1 -2 2 1 -5.602
  [4,16,0,1,-6,0,1,0,2,1,-2,2,1,-5.602],
// 4 16 0 1 -6 -2 1 -5.602 -2 1 -2 0 1 0
  [4,16,0,1,-6,-2,1,-5.602,-2,1,-2,0,1,0],
// 0
];
module ldraw_lib__axle(step=0, col=false, unit=2/5, alt=false, line=0.2, solid=!$preview)
    makepoly(ldraw_lib__axle(solid), step=step, col=col, unit=unit, alt=alt, line=line, solid=solid);
ldraw_lib__axle(line=0.2);
// file: ../p/4-4disc.scad
use <../lib.scad>
$fa=1; $fs=0.2;
function ldraw_lib__4_4disc(realsolid=false) = [
// 0 Disc 1.0
// 0 Name: 4-4disc.dat
// 0 Author: James Jessiman
// 0 !LDRAW_ORG Primitive UPDATE 2002-02
// 0 !LICENSE Licensed under CC BY 2.0 and CC BY 4.0 : see CAreadme.txt
// 
// 0 BFC CERTIFY CCW
  [0,"BFC","CERTIFY"],
  [0,"BFC","CCW"],
// 
// 0 !HISTORY 1998-12-15 [PTadmin] Official Update 1998-10
// 0 !HISTORY 2002-03-23 [sbliss] Added BFC statement
// 0 !HISTORY 2002-04-25 [PTadmin] Official Update 2002-02
// 0 !HISTORY 2007-06-24 [PTadmin] Header formatted for Contributor Agreement
// 0 !HISTORY 2008-07-01 [PTadmin] Official Update 2008-01
// 
// 
// 3 16 0 0 0 1 0 0 0.9239 0 0.3827
  [3,16,0,0,0,1,0,0,0.9239,0,0.3827],
// 3 16 0 0 0 0.9239 0 0.3827 0.7071 0 0.7071
  [3,16,0,0,0,0.9239,0,0.3827,0.7071,0,0.7071],
// 3 16 0 0 0 0.7071 0 0.7071 0.3827 0 0.9239
  [3,16,0,0,0,0.7071,0,0.7071,0.3827,0,0.9239],
// 3 16 0 0 0 0.3827 0 0.9239 0 0 1
  [3,16,0,0,0,0.3827,0,0.9239,0,0,1],
// 3 16 0 0 0 0 0 1 -0.3827 0 0.9239
  [3,16,0,0,0,0,0,1,-0.3827,0,0.9239],
// 3 16 0 0 0 -0.3827 0 0.9239 -0.7071 0 0.7071
  [3,16,0,0,0,-0.3827,0,0.9239,-0.7071,0,0.7071],
// 3 16 0 0 0 -0.7071 0 0.7071 -0.9239 0 0.3827
  [3,16,0,0,0,-0.7071,0,0.7071,-0.9239,0,0.3827],
// 3 16 0 0 0 -0.9239 0 0.3827 -1 0 -0
  [3,16,0,0,0,-0.9239,0,0.3827,-1,0,-0],
// 3 16 0 0 0 -1 0 -0 -0.9239 0 -0.3827
  [3,16,0,0,0,-1,0,-0,-0.9239,0,-0.3827],
// 3 16 0 0 0 -0.9239 0 -0.3827 -0.7071 0 -0.7071
  [3,16,0,0,0,-0.9239,0,-0.3827,-0.7071,0,-0.7071],
// 3 16 0 0 0 -0.7071 0 -0.7071 -0.3827 0 -0.9239
  [3,16,0,0,0,-0.7071,0,-0.7071,-0.3827,0,-0.9239],
// 3 16 0 0 0 -0.3827 0 -0.9239 0 0 -1
  [3,16,0,0,0,-0.3827,0,-0.9239,0,0,-1],
// 3 16 0 0 0 0 0 -1 0.3827 0 -0.9239
  [3,16,0,0,0,0,0,-1,0.3827,0,-0.9239],
// 3 16 0 0 0 0.3827 0 -0.9239 0.7071 0 -0.7071
  [3,16,0,0,0,0.3827,0,-0.9239,0.7071,0,-0.7071],
// 3 16 0 0 0 0.7071 0 -0.7071 0.9239 0 -0.3827
  [3,16,0,0,0,0.7071,0,-0.7071,0.9239,0,-0.3827],
// 3 16 0 0 0 0.9239 0 -0.3827 1 0 0
  [3,16,0,0,0,0.9239,0,-0.3827,1,0,0],
// 0
];
module ldraw_lib__4_4disc(step=0, col=false, unit=2/5, alt=false, line=0.2, solid=!$preview)
    makepoly(ldraw_lib__4_4disc(solid), step=step, col=col, unit=unit, alt=alt, line=line, solid=solid);
ldraw_lib__4_4disc(line=0.2);
// file: ../p/4-4cylc.scad
use <../lib.scad>
use <4-4cyli.scad>
use <4-4disc.scad>
use <4-4edge.scad>
$fa=1; $fs=0.2;
function ldraw_lib__4_4cylc(realsolid=false) = [
// 0 Cylinder Closed 1.0
// 0 Name: 4-4cylc.dat
// 0 Author: Alex Taylor [anathema]
// 0 !LDRAW_ORG Primitive UPDATE 2009-02
// 0 !LICENSE Licensed under CC BY 2.0 and CC BY 4.0 : see CAreadme.txt
// 
// 0 BFC CERTIFY CCW
  [0,"BFC","CERTIFY"],
  [0,"BFC","CCW"],
// 
// 0 !HISTORY 2008-12-29 [cwdee] Removed one disc
// 0 !HISTORY 2009-09-03 [PTadmin] Official Update 2009-02
// 
// 
// 1 16 0 0 0 1 0 0 0 1 0 0 0 1 4-4edge.dat
  [1,16,0,0,0,1,0,0,0,1,0,0,0,1, ldraw_lib__4_4edge(realsolid)],
// 1 16 0 1 0 1 0 0 0 1 0 0 0 1 4-4edge.dat
  [1,16,0,1,0,1,0,0,0,1,0,0,0,1, ldraw_lib__4_4edge(realsolid)],
// 1 16 0 0 0 1 0 0 0 1 0 0 0 1 4-4disc.dat
  [1,16,0,0,0,1,0,0,0,1,0,0,0,1, ldraw_lib__4_4disc(realsolid)],
// 1 16 0 0 0 1 0 0 0 1 0 0 0 1 4-4cyli.dat
  [1,16,0,0,0,1,0,0,0,1,0,0,0,1, ldraw_lib__4_4cyli(realsolid)],
// 0
];
module ldraw_lib__4_4cylc(step=0, col=false, unit=2/5, alt=false, line=0.2, solid=!$preview)
    makepoly(ldraw_lib__4_4cylc(solid), step=step, col=col, unit=unit, alt=alt, line=line, solid=solid);
ldraw_lib__4_4cylc(line=0.2);
// main file
use <../lib.scad>
use <../p/4-4cylc.scad>
use <../p/4-4disc.scad>
use <../p/axle.scad>
$fa=1; $fs=0.2;
function ldraw_lib__24316(realsolid=false) = [
// 0 Technic Axle  3 with Stop
// 0 Name: 24316.dat
// 0 Author: Owen Burgoyne [C3POwen]
// 0 !LDRAW_ORG Part UPDATE 2016-01
// 0 !LICENSE Licensed under CC BY 2.0 and CC BY 4.0 : see CAreadme.txt
// 
// 0 BFC CERTIFY CCW
  [0,"BFC","CERTIFY"],
  [0,"BFC","CCW"],
// 
// 0 !HISTORY 2016-12-31 [PTadmin] Official Update 2016-01
// 
// 
// 1 16 -30 0 0 0 58 0 1 0 0 0 0 1 axle.dat
  [1,16,-30,0,0,0,58,0,1,0,0,0,0,1, ldraw_lib__axle(realsolid)],
// 1 16 28 0 0 0 1 0 -8 0 0 0 0 8 4-4disc.dat
  [1,16,28,0,0,0,1,0,-8,0,0,0,0,8, ldraw_lib__4_4disc(realsolid)],
// 1 16 30 0 0 0 -2 0 8 0 0 0 0 8 4-4cylc.dat
  [1,16,30,0,0,0,-2,0,8,0,0,0,0,8, ldraw_lib__4_4cylc(realsolid)],
];
module ldraw_lib__24316(step=0, col=false, unit=2/5, alt=false, line=0.2, solid=!$preview)
    makepoly(ldraw_lib__24316(solid), step=step, col=col, unit=unit, alt=alt, line=line, solid=solid);
ldraw_lib__24316(line=0.2);
